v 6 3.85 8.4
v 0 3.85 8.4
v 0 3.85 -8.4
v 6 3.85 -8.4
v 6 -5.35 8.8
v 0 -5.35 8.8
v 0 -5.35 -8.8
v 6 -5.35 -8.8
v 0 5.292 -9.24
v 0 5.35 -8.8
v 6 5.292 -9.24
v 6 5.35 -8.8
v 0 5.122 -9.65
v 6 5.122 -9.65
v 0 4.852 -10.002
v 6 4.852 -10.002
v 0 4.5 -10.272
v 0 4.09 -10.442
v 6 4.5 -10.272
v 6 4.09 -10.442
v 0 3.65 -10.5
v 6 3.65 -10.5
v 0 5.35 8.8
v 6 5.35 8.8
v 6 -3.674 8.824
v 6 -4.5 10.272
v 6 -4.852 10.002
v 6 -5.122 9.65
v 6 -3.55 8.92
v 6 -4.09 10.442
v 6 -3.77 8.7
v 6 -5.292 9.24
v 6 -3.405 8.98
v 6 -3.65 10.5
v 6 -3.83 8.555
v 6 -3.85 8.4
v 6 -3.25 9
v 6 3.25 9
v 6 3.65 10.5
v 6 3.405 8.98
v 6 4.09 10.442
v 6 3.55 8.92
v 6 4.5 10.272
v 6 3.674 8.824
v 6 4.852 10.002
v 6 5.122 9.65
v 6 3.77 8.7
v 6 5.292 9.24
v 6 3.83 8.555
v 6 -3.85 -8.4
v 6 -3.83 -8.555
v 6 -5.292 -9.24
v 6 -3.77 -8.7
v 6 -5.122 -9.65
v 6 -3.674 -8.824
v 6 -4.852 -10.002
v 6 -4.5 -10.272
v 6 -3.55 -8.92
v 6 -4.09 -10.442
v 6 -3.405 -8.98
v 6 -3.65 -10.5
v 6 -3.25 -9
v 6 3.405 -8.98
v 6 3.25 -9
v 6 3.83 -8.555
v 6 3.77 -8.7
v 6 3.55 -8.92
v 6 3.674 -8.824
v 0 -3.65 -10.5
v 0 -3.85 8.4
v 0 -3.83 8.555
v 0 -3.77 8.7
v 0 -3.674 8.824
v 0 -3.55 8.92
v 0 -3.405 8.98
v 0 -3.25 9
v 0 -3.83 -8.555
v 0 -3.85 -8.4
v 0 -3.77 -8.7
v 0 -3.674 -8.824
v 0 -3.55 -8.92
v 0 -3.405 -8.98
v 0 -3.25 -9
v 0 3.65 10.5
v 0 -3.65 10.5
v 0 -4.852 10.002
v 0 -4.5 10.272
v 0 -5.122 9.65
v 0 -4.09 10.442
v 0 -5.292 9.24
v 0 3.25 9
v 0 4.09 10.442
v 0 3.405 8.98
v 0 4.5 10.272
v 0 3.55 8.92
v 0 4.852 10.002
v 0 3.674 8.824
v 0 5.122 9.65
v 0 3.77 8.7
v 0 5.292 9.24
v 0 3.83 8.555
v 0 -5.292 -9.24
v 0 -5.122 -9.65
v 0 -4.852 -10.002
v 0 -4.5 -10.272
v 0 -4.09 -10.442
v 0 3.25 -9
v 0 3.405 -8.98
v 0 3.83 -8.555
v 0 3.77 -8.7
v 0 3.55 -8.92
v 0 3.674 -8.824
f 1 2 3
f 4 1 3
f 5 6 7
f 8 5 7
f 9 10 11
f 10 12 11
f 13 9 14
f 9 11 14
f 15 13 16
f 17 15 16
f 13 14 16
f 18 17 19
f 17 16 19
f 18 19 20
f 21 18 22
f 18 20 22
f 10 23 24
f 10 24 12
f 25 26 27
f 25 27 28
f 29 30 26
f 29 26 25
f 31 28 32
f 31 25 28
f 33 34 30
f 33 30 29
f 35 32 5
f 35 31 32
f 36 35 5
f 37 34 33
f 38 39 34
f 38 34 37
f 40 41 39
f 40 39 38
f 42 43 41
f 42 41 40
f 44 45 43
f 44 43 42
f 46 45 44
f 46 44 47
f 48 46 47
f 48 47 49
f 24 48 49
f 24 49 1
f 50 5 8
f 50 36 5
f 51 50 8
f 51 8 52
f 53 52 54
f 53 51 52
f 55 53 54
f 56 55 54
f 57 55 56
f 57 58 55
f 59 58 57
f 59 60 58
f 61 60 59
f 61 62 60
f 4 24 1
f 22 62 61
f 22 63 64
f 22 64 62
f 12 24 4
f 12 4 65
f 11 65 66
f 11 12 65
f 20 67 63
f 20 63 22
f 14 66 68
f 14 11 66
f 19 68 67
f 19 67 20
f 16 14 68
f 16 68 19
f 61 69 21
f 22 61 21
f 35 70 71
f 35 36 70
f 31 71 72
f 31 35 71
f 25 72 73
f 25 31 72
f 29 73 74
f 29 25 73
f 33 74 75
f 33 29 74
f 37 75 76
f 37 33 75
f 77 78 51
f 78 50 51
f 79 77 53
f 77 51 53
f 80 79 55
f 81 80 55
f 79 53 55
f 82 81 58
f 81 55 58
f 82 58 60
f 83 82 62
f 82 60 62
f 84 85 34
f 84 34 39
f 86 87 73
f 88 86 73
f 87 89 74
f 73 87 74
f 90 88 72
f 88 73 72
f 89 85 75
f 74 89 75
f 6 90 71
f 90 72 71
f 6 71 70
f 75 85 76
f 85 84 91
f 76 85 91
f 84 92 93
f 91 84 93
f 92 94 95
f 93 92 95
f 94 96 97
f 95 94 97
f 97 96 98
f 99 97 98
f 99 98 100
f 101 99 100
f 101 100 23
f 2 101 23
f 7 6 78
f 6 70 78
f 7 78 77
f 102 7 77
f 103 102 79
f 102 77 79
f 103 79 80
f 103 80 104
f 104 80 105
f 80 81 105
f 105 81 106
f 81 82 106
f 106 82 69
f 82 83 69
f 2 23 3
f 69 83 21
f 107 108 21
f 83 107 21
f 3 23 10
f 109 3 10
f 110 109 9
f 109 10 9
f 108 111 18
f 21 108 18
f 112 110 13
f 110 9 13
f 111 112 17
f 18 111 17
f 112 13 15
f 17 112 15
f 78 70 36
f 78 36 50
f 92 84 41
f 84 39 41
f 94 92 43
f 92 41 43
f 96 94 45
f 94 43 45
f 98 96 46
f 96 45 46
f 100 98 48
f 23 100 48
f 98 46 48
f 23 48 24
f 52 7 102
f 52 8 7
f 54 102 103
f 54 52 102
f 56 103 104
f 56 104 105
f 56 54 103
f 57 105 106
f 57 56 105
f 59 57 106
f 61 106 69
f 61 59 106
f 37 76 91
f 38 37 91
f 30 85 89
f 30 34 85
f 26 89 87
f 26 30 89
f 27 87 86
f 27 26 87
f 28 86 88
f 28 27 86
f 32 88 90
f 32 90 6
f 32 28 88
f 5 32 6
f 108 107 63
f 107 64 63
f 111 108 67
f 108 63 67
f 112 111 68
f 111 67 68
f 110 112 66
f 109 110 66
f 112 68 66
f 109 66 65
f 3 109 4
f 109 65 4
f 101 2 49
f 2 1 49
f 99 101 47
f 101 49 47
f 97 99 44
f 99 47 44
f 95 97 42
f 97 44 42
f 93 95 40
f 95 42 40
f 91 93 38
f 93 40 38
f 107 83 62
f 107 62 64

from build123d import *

# Parameters (mm, degrees)
SKETCH1_W           = 21
SKETCH1_H           = 10.7
SKETCH1_W_2         = 18
SKETCH1_H_2         = 7.7
BOSS_EXTRUDE1_DEPTH = 6
FILLET1_R           = 0.6
FILLET2_R           = 1.7


with BuildPart() as part:
    # Sketch1 → Boss-Extrude1 (new body)
    with BuildSketch(Plane(origin=(0, 0, 0), x_dir=(0, 0, -1), z_dir=(1, 0, 0))):
        Rectangle(SKETCH1_W, SKETCH1_H)
        Rectangle(SKETCH1_W_2, SKETCH1_H_2, mode=Mode.SUBTRACT)
    extrude(amount=BOSS_EXTRUDE1_DEPTH)

    # Fillet1
    fillet1_edges = [part.edges().sort_by_distance(p)[0] for p in [
        (3, -3.85, -9),
        (3, 3.85, -9),
        (3, 3.85, 9),
        (3, -3.85, 9),
    ]]
    fillet(fillet1_edges, radius=FILLET1_R)

    # Fillet2
    fillet2_edges = [part.edges().sort_by_distance(p)[0] for p in [
        (3, -5.35, -10.5),
        (3, -5.35, 10.5),
        (3, 5.35, 10.5),
        (3, 5.35, -10.5),
    ]]
    fillet(fillet2_edges, radius=FILLET2_R)


solid = part.part
